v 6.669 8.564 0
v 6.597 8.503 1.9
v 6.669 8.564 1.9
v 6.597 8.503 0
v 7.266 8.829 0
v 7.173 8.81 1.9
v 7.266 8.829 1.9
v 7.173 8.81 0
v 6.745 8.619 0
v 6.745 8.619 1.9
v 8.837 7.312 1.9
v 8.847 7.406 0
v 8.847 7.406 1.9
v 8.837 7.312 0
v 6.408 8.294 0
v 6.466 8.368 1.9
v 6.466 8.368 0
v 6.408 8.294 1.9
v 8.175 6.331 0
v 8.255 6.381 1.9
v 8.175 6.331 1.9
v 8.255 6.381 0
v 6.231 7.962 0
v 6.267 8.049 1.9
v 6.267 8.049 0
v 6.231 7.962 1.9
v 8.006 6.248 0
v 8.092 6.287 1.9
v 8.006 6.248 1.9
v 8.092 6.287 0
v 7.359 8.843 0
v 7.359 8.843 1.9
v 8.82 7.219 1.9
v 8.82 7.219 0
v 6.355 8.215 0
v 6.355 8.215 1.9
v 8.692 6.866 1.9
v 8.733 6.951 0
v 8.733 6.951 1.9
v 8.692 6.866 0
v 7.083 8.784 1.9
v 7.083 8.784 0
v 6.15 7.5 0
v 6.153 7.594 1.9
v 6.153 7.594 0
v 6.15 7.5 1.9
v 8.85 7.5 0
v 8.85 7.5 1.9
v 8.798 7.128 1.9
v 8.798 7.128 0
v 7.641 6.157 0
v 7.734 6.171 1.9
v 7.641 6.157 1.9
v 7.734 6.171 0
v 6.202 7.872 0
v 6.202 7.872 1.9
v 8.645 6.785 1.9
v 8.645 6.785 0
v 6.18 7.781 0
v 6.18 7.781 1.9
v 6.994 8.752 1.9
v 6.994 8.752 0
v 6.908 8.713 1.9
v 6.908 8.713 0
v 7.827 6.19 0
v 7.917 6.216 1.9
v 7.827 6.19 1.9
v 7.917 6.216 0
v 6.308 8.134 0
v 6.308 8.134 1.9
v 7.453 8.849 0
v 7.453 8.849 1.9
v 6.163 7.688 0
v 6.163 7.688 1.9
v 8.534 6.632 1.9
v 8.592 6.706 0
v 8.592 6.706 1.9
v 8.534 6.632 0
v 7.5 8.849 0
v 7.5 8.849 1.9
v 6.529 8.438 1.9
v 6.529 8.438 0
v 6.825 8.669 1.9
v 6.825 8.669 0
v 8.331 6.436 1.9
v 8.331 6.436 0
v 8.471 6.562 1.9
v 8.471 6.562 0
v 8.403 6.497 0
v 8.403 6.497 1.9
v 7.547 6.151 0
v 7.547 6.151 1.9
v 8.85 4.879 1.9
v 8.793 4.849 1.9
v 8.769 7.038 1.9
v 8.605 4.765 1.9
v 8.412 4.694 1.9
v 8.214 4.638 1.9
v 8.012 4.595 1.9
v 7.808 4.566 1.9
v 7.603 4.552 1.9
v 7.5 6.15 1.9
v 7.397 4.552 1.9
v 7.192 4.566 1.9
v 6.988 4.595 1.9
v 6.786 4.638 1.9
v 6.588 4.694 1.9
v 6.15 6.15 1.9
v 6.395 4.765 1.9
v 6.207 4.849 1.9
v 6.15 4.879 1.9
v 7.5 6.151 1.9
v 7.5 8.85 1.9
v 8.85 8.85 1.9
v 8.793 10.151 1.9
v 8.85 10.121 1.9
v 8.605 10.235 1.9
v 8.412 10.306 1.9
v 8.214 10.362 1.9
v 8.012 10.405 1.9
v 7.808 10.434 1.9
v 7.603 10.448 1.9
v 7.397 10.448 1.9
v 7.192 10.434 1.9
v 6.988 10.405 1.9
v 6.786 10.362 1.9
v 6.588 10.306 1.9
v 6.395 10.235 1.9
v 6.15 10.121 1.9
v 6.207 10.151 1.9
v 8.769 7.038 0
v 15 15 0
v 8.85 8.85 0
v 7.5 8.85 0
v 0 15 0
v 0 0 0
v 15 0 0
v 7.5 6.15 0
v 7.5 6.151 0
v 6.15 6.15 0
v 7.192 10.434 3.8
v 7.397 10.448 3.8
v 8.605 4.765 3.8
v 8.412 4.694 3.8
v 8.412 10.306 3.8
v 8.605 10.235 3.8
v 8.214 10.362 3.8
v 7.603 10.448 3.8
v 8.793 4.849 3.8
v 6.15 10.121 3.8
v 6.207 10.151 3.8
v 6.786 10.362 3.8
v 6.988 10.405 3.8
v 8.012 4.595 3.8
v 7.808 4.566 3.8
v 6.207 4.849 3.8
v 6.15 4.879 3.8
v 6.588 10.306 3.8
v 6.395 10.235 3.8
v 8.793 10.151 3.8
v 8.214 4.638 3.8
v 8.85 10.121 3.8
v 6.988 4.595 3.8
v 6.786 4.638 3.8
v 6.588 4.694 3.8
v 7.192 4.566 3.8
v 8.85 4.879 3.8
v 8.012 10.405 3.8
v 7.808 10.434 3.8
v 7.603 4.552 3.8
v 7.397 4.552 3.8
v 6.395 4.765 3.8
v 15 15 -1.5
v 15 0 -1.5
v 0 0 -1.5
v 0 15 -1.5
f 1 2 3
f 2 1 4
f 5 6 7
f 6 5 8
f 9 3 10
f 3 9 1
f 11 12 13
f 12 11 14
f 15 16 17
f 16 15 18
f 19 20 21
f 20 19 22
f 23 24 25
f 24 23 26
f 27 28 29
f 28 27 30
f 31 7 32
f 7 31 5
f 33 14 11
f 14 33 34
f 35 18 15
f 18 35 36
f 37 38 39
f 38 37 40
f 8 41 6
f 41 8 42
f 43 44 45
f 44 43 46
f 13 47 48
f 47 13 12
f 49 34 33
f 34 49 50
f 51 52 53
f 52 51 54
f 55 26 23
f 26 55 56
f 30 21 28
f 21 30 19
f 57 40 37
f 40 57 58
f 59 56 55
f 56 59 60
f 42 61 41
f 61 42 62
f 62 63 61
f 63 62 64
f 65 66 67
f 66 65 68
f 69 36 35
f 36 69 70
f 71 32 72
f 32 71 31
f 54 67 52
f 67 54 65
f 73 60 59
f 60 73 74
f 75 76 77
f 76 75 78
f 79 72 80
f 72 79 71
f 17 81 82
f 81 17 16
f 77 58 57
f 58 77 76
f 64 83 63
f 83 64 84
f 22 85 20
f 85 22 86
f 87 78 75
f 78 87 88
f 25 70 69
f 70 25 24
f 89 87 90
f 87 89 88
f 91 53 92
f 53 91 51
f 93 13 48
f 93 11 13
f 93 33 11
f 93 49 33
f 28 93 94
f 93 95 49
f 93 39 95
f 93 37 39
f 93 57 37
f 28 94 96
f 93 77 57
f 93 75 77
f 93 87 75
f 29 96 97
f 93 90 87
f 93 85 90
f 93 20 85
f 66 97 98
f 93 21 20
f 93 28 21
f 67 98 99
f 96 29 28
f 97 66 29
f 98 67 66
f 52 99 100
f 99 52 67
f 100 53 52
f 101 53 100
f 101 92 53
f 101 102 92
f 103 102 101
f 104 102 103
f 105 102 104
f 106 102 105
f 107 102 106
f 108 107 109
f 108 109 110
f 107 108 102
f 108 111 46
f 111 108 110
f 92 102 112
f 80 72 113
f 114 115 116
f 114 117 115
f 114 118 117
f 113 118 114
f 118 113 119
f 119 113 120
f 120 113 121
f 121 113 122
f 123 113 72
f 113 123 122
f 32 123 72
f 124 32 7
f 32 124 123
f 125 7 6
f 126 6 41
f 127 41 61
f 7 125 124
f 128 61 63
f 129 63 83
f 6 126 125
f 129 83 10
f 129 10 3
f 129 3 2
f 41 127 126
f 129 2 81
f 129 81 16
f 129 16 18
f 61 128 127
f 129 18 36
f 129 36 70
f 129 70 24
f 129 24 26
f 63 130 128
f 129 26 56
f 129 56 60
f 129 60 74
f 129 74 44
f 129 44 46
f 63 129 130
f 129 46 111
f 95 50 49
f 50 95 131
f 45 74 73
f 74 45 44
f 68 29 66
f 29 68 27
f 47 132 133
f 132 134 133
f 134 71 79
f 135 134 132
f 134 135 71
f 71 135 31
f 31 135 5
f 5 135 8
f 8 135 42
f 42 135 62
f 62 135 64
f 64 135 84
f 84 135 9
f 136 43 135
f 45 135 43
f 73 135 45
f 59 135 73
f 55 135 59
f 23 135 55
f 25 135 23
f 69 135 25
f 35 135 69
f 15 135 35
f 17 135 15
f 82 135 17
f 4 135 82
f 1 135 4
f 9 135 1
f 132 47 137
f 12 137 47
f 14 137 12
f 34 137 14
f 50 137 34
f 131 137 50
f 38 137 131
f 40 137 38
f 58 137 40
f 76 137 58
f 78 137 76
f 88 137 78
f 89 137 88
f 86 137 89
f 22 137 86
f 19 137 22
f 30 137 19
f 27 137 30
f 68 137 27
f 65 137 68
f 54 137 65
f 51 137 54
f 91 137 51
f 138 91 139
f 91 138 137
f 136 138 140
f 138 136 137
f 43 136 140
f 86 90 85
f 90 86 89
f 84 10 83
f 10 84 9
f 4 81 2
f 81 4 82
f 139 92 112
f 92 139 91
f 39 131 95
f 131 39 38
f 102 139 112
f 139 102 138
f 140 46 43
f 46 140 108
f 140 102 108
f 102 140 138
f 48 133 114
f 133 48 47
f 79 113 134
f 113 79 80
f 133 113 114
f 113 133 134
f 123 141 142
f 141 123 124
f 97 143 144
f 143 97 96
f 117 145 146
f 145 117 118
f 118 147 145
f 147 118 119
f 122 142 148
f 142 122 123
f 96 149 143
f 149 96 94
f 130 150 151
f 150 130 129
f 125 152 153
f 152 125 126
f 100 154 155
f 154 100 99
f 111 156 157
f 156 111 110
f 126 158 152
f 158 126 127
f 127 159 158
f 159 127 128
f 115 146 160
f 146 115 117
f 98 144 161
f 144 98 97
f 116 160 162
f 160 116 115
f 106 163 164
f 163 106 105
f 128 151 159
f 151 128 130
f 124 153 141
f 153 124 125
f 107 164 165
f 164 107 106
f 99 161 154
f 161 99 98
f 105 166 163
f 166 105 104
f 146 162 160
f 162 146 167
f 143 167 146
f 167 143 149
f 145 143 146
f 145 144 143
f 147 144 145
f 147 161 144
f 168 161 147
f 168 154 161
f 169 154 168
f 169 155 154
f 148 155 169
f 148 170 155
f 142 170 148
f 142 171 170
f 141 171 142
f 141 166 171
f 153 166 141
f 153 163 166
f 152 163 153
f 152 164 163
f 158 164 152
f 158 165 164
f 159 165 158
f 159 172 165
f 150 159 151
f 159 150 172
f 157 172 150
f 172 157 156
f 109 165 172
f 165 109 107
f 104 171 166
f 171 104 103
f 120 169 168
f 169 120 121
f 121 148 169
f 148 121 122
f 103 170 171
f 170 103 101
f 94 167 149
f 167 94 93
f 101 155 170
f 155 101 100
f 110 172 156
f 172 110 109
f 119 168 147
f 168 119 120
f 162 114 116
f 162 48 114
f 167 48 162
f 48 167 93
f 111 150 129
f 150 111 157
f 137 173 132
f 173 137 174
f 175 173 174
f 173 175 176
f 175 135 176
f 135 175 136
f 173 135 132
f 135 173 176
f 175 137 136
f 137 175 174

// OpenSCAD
////////// Diamond File Box //////////////////////


///////////// Parameters /////////////////////
$fn=90;

top_width = 15;
top_length = 15;
top_height = 1.5;

throat_length = 2.7;
throat_width = 2.7;
throat_height = 1.9;

foot_width = throat_width;
foot_length = throat_length + 2*1.6;
foot_height = 2;

//////////// Render ////////////////////////

// base
translate([0, 0, -top_height])
	cube([top_width, top_length, top_height]);

// throat
translate([(top_width - throat_width) / 2,
           (top_length - throat_length) / 2,
           0]) {
		translate([throat_width/2, throat_length/2,0]) 
			cylinder(h=throat_height, r=throat_width/2);
		cube([throat_width/2, throat_length/2, throat_height]);
		translate([throat_width/2, throat_length/2,0]) 
			cube([throat_width/2, throat_length/2, throat_height]);
}

// foot
intersection() {
	translate([top_width / 2, top_length / 2, throat_height])
		cylinder(h=throat_height, d=foot_length);
	translate([top_width/2 - throat_width/2, 0, 0])
		cube([throat_width, 1000, 1000]);
}
//////////////////// Modules ///////////////////////////
